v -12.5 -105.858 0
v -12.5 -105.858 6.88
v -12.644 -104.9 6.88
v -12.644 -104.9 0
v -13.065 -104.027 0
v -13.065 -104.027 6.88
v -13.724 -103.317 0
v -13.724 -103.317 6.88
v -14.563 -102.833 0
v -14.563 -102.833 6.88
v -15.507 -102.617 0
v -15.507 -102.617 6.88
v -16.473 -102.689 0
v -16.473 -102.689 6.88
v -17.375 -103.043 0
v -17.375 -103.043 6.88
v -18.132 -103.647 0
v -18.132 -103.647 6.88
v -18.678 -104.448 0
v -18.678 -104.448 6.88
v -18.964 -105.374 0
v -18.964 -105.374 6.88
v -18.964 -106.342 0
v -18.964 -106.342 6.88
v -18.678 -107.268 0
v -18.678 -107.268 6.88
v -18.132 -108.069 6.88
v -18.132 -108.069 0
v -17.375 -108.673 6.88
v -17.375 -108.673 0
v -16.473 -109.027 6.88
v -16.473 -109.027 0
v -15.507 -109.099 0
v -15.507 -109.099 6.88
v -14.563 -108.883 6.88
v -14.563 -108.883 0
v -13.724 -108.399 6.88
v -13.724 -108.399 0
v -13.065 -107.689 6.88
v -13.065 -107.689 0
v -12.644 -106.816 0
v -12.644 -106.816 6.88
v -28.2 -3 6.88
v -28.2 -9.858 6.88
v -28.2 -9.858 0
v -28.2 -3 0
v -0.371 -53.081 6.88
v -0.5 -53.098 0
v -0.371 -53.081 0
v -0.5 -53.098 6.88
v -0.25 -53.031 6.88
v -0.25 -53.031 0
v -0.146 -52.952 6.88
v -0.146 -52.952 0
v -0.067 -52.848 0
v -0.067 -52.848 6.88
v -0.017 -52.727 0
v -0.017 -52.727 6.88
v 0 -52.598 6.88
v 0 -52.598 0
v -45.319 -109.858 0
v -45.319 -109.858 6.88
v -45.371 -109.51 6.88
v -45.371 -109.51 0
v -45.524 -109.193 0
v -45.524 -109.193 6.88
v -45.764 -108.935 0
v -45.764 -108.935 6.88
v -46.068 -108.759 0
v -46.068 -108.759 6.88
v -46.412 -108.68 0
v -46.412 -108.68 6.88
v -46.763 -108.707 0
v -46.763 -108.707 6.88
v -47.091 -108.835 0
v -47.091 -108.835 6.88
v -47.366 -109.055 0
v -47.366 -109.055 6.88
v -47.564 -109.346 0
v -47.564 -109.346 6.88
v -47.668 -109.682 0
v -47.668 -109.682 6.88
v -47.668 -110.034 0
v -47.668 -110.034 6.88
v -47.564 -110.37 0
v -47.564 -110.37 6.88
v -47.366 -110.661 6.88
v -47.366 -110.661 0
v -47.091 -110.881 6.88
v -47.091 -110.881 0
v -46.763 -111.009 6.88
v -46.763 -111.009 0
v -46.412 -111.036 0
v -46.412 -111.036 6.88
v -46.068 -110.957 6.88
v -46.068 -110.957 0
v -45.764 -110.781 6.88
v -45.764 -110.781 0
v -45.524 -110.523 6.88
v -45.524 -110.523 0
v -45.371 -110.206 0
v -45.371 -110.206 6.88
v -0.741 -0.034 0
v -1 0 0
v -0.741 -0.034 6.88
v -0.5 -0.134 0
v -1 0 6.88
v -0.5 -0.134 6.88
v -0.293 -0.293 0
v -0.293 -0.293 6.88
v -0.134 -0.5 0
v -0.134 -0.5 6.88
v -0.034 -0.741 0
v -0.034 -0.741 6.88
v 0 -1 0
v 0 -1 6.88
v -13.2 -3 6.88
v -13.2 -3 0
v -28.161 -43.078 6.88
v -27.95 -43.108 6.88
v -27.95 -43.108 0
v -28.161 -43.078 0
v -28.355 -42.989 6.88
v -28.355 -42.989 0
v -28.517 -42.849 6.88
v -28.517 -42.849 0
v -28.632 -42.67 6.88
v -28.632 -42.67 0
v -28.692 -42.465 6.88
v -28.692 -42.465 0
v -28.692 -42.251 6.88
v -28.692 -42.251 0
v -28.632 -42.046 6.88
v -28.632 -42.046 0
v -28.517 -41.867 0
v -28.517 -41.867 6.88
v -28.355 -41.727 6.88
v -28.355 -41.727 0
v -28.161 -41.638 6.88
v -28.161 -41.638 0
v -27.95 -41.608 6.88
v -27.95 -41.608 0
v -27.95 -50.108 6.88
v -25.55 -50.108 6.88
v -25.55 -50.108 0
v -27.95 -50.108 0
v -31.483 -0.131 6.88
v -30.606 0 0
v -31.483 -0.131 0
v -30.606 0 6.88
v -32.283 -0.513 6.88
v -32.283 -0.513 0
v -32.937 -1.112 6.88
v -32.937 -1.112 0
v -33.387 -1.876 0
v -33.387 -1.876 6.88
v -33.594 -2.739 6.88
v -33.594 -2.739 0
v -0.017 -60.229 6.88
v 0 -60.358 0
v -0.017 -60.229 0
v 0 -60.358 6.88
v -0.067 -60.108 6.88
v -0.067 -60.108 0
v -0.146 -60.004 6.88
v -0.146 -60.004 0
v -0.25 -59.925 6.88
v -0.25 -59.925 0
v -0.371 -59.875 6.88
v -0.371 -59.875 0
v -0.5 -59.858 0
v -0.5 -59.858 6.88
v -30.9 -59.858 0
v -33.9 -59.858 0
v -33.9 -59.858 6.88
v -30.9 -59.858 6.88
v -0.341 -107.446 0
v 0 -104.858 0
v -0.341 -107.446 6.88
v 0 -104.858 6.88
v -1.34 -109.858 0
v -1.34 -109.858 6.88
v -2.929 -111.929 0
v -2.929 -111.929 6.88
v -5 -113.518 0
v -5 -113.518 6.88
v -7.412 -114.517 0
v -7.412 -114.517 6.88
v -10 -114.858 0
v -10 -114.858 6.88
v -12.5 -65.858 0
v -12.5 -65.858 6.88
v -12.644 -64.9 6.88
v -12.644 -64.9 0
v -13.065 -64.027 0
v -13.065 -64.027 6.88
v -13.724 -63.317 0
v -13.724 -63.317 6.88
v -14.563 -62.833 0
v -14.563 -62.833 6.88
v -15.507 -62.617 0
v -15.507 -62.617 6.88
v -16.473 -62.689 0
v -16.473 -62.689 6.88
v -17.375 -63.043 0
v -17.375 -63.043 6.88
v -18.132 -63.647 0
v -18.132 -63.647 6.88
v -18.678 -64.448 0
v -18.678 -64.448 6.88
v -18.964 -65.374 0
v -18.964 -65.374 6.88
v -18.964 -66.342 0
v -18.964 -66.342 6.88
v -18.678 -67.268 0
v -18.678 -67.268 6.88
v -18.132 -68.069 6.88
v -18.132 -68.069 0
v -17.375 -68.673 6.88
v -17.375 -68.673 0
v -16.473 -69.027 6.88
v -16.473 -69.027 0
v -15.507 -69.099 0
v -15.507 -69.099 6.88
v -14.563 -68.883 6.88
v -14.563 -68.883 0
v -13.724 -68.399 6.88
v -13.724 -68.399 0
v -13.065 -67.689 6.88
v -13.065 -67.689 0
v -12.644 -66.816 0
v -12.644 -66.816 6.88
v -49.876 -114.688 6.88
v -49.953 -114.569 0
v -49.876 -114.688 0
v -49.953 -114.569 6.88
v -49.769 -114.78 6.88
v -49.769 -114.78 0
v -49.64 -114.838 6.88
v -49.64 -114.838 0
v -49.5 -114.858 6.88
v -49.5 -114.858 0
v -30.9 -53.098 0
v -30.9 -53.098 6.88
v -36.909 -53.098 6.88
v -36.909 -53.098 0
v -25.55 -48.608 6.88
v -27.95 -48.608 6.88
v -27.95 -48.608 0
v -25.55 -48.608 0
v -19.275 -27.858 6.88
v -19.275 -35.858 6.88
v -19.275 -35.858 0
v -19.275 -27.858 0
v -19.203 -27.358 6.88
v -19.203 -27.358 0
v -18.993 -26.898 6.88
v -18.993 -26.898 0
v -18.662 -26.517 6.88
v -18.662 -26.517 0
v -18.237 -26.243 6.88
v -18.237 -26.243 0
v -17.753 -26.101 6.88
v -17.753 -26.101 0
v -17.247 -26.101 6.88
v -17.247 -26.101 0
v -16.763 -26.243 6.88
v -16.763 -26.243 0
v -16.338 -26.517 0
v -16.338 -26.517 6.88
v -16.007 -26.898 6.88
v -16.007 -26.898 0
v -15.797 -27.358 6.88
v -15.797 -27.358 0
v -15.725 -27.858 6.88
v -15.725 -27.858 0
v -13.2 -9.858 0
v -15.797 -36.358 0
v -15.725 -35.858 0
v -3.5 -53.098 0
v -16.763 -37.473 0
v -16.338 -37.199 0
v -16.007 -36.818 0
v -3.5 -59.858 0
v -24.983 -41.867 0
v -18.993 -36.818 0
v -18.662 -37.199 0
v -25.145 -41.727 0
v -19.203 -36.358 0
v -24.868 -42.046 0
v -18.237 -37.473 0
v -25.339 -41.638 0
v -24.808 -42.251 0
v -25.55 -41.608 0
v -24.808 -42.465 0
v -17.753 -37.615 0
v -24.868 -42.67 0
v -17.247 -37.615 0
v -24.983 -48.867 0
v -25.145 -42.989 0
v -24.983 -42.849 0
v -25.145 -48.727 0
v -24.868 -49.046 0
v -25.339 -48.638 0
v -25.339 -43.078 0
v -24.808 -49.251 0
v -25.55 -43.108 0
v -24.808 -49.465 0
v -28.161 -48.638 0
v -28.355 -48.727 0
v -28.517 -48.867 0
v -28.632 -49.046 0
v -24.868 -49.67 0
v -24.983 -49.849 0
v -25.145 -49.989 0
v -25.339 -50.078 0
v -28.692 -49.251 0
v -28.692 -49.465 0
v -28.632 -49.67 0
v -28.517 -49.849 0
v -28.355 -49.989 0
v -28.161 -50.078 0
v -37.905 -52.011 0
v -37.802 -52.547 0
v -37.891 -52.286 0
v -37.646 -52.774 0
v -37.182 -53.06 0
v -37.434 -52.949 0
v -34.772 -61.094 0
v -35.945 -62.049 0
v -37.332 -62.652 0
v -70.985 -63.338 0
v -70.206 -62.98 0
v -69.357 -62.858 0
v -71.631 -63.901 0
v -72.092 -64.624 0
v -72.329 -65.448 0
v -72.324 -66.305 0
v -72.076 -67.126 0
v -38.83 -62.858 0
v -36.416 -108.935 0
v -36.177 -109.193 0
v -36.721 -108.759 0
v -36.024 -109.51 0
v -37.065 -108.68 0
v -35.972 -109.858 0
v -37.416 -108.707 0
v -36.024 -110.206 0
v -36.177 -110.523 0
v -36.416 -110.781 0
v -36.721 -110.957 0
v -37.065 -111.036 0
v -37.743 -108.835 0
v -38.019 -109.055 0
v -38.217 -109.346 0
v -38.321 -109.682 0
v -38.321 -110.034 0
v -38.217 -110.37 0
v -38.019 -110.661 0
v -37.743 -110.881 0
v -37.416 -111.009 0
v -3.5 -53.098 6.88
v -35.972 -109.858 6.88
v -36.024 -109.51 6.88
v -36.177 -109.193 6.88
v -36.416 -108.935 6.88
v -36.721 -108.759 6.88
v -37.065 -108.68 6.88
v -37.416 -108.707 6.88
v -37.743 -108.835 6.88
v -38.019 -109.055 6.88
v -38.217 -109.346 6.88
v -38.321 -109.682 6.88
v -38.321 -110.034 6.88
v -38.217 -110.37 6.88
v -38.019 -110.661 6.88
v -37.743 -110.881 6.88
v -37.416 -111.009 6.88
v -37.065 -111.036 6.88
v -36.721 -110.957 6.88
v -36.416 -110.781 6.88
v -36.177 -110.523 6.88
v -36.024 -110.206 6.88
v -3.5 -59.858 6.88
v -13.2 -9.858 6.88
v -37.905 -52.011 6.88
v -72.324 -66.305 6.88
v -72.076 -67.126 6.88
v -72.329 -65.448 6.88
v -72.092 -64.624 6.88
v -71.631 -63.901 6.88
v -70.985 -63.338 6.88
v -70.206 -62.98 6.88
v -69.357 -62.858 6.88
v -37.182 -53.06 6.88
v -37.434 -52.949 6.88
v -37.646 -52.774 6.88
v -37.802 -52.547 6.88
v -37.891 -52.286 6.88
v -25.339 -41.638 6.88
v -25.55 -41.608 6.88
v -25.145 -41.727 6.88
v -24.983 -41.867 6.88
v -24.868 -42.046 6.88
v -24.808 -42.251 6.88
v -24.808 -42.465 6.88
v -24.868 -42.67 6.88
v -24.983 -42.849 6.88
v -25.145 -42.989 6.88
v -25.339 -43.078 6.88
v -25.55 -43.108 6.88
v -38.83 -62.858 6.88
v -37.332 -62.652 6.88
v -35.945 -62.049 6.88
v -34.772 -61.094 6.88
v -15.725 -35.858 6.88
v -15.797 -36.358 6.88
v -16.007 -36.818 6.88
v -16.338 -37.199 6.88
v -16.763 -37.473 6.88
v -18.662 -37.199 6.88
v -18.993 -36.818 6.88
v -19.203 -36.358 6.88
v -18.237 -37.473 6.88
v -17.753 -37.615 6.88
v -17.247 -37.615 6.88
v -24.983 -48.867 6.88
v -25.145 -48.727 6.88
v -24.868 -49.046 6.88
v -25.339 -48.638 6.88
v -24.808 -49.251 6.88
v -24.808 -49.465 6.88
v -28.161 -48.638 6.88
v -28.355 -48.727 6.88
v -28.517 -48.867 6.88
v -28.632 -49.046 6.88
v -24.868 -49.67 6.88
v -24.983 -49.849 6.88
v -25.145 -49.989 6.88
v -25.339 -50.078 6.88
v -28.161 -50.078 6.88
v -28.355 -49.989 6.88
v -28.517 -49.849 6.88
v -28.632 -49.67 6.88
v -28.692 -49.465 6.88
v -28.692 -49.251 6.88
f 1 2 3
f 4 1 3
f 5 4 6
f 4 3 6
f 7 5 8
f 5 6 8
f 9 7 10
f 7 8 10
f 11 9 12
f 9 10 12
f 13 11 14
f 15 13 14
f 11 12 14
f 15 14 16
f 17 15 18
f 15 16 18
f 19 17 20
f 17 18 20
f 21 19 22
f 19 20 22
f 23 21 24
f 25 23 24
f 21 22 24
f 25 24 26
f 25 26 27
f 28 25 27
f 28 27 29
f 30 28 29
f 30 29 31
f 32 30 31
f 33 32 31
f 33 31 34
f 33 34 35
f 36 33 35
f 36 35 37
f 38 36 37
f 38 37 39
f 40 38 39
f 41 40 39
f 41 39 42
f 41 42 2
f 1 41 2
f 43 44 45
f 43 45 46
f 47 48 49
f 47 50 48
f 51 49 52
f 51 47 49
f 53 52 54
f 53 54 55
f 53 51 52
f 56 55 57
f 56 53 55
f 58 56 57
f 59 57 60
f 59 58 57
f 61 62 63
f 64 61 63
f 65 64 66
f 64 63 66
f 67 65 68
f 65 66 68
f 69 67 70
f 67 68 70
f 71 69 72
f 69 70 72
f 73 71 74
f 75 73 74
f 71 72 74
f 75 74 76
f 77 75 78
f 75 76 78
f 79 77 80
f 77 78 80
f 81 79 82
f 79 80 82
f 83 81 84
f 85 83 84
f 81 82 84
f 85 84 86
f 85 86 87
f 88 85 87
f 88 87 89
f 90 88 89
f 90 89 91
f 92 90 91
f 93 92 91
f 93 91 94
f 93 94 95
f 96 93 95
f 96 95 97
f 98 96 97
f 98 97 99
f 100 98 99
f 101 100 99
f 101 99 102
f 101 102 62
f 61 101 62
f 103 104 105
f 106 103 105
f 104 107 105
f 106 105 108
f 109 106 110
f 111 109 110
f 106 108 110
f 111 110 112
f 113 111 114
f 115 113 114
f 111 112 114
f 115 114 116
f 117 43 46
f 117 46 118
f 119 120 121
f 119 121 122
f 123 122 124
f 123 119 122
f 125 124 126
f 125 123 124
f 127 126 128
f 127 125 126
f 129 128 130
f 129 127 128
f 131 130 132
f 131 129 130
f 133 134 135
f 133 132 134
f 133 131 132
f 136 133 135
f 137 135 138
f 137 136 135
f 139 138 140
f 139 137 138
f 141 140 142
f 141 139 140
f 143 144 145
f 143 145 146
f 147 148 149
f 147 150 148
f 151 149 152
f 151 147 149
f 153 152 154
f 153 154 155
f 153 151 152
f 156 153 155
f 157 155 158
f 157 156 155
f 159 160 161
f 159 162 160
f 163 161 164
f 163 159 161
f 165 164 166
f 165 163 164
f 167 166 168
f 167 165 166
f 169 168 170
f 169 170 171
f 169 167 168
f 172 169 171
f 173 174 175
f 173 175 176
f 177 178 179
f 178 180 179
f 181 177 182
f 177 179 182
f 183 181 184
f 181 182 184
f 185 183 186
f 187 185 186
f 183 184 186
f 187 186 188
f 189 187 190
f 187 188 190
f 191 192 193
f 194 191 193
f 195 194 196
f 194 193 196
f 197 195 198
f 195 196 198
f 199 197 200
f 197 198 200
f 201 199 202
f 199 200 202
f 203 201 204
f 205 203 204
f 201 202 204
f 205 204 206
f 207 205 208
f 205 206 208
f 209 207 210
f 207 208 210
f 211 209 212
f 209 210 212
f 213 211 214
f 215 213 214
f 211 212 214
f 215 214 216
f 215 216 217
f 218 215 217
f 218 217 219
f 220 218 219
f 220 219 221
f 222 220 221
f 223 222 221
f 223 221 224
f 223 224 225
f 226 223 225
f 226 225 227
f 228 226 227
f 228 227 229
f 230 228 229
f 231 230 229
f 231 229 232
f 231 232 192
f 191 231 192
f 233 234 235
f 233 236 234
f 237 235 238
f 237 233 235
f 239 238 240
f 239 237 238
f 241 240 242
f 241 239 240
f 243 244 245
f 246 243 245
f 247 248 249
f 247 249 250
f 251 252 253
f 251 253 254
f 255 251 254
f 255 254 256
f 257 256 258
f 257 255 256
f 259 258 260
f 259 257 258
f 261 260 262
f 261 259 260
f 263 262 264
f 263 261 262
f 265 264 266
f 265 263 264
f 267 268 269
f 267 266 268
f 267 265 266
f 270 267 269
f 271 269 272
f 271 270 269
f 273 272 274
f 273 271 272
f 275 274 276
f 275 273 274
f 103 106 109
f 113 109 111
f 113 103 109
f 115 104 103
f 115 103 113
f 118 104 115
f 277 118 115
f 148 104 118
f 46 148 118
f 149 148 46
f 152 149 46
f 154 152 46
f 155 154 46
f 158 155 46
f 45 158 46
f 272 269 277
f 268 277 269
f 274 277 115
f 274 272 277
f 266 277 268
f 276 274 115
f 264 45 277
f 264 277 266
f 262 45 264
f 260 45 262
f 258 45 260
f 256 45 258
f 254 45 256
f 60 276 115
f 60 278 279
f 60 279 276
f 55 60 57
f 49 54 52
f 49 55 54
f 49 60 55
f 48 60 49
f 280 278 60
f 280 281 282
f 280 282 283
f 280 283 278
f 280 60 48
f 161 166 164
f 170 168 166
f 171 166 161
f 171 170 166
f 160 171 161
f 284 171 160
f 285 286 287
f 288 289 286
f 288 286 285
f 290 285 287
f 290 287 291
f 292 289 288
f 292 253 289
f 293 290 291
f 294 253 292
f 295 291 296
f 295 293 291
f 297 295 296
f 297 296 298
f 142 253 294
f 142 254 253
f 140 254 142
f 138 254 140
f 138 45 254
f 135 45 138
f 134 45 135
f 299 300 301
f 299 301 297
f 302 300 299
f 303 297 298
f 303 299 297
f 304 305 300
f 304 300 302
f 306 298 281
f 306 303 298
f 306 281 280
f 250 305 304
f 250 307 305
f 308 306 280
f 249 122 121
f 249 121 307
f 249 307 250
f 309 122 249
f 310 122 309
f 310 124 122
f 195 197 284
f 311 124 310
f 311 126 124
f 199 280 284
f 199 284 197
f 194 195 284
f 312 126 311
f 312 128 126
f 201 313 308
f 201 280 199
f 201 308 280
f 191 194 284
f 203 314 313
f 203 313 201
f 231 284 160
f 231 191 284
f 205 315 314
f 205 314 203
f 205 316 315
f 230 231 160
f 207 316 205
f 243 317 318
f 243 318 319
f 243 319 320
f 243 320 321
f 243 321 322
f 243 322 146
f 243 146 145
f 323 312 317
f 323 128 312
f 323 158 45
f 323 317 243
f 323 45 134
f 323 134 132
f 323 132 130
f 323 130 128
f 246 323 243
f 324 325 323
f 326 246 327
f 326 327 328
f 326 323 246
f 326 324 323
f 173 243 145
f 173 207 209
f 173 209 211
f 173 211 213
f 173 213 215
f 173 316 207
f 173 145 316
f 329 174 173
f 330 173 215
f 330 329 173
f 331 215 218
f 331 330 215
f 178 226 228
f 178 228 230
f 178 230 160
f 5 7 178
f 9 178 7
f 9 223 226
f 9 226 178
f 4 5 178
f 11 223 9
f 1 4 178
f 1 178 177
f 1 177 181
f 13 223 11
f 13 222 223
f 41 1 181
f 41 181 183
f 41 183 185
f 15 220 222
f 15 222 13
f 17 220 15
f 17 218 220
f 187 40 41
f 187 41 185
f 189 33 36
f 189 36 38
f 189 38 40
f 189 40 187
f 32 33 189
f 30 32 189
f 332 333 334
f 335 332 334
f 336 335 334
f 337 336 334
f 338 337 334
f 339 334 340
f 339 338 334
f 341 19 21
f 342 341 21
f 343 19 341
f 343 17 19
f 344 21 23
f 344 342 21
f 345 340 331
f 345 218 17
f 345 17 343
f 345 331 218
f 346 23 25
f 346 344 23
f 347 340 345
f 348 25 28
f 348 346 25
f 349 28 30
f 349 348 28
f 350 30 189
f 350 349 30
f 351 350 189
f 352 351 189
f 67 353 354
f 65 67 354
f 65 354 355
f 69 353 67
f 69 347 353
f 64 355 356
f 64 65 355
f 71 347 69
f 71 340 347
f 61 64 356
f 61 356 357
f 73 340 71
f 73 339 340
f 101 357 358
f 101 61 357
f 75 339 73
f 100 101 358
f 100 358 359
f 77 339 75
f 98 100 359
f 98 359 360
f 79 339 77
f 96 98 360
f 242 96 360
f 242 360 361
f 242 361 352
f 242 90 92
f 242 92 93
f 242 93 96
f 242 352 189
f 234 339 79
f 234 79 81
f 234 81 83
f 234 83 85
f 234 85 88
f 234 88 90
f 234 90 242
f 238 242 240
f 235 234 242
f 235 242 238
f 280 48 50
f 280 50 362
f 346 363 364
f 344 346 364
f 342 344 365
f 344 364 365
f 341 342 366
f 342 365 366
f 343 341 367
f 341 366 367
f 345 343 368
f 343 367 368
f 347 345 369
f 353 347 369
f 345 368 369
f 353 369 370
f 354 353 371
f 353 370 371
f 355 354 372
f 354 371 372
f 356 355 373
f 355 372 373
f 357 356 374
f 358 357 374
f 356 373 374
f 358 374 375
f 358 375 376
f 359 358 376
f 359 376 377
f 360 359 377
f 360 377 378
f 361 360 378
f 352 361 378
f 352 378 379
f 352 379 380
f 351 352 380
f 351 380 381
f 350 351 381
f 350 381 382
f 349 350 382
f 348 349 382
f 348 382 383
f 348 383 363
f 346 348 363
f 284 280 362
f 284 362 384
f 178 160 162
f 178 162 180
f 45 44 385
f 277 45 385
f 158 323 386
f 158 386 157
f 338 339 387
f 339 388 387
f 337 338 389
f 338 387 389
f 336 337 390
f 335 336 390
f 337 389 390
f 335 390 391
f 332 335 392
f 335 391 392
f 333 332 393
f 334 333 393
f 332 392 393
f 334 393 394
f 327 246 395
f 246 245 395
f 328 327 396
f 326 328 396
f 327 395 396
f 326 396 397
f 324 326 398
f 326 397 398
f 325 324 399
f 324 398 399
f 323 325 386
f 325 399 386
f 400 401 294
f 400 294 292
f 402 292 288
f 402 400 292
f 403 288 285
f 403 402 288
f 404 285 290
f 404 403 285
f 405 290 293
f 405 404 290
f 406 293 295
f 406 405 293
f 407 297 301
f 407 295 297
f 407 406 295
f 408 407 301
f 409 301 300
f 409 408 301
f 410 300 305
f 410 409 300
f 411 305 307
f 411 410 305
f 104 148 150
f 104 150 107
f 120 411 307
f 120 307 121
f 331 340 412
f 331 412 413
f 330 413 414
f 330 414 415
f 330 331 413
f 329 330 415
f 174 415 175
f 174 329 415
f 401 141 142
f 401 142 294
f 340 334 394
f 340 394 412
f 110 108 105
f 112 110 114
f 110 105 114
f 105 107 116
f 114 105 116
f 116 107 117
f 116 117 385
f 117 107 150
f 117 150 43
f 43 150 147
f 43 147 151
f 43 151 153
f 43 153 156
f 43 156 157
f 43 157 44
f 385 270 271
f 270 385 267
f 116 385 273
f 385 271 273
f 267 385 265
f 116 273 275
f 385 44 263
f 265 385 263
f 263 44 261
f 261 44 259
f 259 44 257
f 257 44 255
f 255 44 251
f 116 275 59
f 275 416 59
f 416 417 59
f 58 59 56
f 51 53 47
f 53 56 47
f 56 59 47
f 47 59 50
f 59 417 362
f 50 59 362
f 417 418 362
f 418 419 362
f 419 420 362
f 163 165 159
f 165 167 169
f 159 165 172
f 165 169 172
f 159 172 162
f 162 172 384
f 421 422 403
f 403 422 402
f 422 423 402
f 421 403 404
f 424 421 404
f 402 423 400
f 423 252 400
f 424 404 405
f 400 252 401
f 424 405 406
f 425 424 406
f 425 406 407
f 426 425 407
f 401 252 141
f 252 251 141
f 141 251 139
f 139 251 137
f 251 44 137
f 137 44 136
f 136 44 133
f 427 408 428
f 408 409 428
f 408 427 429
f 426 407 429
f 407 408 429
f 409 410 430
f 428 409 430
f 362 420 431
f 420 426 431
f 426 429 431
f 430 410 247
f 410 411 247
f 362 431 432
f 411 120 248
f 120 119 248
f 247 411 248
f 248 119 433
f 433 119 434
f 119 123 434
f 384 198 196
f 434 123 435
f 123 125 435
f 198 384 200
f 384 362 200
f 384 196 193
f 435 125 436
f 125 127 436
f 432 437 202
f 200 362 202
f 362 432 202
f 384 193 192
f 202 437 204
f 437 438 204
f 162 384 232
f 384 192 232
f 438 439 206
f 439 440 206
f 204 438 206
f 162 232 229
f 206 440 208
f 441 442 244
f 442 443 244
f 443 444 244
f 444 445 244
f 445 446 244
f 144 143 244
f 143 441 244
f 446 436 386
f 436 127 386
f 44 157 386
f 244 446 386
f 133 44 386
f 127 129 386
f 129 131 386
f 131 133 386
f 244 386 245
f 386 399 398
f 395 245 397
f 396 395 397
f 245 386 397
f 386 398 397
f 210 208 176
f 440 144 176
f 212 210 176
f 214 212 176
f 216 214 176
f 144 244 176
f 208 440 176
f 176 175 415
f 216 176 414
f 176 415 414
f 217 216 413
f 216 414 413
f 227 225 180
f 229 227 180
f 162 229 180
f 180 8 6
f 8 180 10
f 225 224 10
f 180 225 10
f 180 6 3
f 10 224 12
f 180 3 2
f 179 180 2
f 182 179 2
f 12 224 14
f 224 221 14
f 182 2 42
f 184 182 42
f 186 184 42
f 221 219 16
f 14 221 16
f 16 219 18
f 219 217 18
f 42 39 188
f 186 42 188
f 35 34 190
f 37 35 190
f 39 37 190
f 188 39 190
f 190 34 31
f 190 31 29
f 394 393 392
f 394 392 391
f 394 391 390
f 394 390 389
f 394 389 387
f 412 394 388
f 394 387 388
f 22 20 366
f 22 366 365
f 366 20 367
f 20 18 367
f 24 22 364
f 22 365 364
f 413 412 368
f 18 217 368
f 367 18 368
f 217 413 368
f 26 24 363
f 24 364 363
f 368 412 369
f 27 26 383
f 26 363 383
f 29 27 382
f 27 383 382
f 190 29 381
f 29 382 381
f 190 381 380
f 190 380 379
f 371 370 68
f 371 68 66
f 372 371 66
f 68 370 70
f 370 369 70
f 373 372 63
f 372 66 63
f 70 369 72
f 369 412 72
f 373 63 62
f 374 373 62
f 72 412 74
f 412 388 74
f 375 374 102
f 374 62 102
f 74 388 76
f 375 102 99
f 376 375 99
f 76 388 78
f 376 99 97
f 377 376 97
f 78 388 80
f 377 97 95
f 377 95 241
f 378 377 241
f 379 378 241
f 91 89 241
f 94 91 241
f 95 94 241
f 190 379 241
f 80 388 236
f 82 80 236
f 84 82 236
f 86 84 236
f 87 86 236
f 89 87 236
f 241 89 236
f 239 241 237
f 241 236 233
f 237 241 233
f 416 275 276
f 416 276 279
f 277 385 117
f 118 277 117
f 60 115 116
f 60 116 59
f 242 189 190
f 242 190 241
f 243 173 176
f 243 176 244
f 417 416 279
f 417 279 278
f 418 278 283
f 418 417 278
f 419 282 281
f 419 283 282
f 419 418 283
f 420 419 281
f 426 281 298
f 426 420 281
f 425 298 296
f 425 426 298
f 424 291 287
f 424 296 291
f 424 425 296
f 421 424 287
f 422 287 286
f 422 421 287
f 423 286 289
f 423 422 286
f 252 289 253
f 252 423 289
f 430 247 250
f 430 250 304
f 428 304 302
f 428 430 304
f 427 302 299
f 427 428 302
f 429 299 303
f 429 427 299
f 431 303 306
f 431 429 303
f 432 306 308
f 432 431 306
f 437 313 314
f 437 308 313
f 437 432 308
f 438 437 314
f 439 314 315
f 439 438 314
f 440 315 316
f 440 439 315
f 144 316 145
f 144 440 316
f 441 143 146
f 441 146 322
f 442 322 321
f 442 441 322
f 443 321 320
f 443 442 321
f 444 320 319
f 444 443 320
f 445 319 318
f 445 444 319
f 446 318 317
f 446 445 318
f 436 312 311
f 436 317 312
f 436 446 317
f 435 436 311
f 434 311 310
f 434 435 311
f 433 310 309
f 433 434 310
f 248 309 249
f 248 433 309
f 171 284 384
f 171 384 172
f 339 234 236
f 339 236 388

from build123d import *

# Parameters (mm, degrees)
BOSS_EXTRUDE1_DEPTH = 6.88
SKETCH2_W           = 15
SKETCH2_H           = 6.858
CUT_EXTRUDE1_DEPTH  = 137.841297579
SKETCH3_R           = 3.25
CUT_EXTRUDE2_DEPTH  = 137.841297579
SKETCH4_R           = 1.1811
CUT_EXTRUDE3_DEPTH  = 137.841297579
CUT_EXTRUDE4_DEPTH  = 137.841297579
FILLET1_R           = 10
FILLET2_R           = 3
FILLET3_R           = 0.5
FILLET4_R           = 1
FILLET5_R           = 5.5512


with BuildPart() as part:
    # Sketch1 → Boss-Extrude1 (new body)
    with BuildSketch(Plane.XY):
        Polygon((-33.3545, 0), (0, 0), (0, -53.098), (-3.5, -53.098), (-3.5, -59.858), (0, -59.858), (0, -114.858), (-49.8185, -114.858), (-74.066498224, -62.858), (-33.899973056, -62.858), (-33.899973056, -59.858), (-30.899973056, -59.858), (-30.899973056, -53.098), (-37.999973056, -53.098), align=None)
    extrude(amount=BOSS_EXTRUDE1_DEPTH)

    # Sketch2 → Cut-Extrude1 (cut, through all)
    with BuildSketch(Plane.XY.offset(6.88)):
        with Locations((-20.7, -6.429)):
            Rectangle(SKETCH2_W, SKETCH2_H)
    extrude(amount=-CUT_EXTRUDE1_DEPTH, mode=Mode.SUBTRACT)

    # Sketch3 → Cut-Extrude2 (cut, through all)
    with BuildSketch(Plane.XY.offset(6.88)):
        with Locations((-15.75, -65.858)):
            Circle(SKETCH3_R)
        with Locations((-15.75, -105.858)):
            Circle(SKETCH3_R)
    extrude(amount=-CUT_EXTRUDE2_DEPTH, mode=Mode.SUBTRACT)

    # Sketch4 → Cut-Extrude3 (cut, through all)
    with BuildSketch(Plane.XY.offset(6.88)):
        with Locations((-46.5, -109.858)):
            Circle(SKETCH4_R)
        with Locations((-37.1528, -109.858)):
            Circle(SKETCH4_R)
        with BuildLine():
            Line((-27.95, -48.608), (-25.55, -48.608))
            ThreePointArc((-25.55, -48.608), (-24.8, -49.358), (-25.55, -50.108))
            Line((-25.55, -50.108), (-27.95, -50.108))
            ThreePointArc((-27.95, -50.108), (-28.7, -49.358), (-27.95, -48.608))
        make_face()
        with BuildLine():
            Line((-27.95, -41.608), (-25.55, -41.608))
            ThreePointArc((-25.55, -41.608), (-24.8, -42.358), (-25.55, -43.108))
            Line((-25.55, -43.108), (-27.95, -43.108))
            ThreePointArc((-27.95, -43.108), (-28.7, -42.358), (-27.95, -41.608))
        make_face()
    extrude(amount=-CUT_EXTRUDE3_DEPTH, mode=Mode.SUBTRACT)

    # Sketch5 → Cut-Extrude4 (cut, through all)
    with BuildSketch(Plane.XY.offset(6.88)):
        with BuildLine():
            Line((-15.725, -27.858), (-15.725, -35.858))
            ThreePointArc((-15.725, -35.858), (-17.5, -37.633), (-19.275, -35.858))
            Line((-19.275, -35.858), (-19.275, -27.858))
            ThreePointArc((-19.275, -27.858), (-17.5, -26.083), (-15.725, -27.858))
        make_face()
    extrude(amount=-CUT_EXTRUDE4_DEPTH, mode=Mode.SUBTRACT)

    # Fillet1
    fillet1_edges = [part.edges().sort_by_distance(p)[0] for p in [
        (0, -114.858, 3.44),
    ]]
    fillet(fillet1_edges, radius=FILLET1_R)

    # Fillet2
    fillet2_edges = [part.edges().sort_by_distance(p)[0] for p in [
        (-74.066498224, -62.858, 3.44),
        (-33.3545, 0, 3.44),
    ]]
    fillet(fillet2_edges, radius=FILLET2_R)

    # Fillet3
    fillet3_edges = [part.edges().sort_by_distance(p)[0] for p in [
        (0, -53.098, 3.44),
        (0, -59.858, 3.44),
        (-49.8185, -114.858, 3.44),
    ]]
    fillet(fillet3_edges, radius=FILLET3_R)

    # Fillet4
    fillet4_edges = [part.edges().sort_by_distance(p)[0] for p in [
        (0, 0, 3.44),
        (-37.999973056, -53.098, 3.44),
    ]]
    fillet(fillet4_edges, radius=FILLET4_R)

    # Fillet5
    # the kernel refuses this fillet: 5.5512 mm, written as the material it adds along each edge
    with BuildSketch(Plane(origin=(-33.899973056, -62.858, 0), x_dir=(0, 1, 0), z_dir=(0, 0, 1))) as fillet5_piece_1:
        with BuildLine():
            CenterArc((5.5512, 4.93023326), FILLET5_R, 180, 62.640229199)
            Line((0, 4.93023326), (-0.111024, 4.93023326))
            Line((-0.111024, 4.93023326), (-0.111024, 0))
            Line((-0.111024, 0), (0, -0.111024))
            ThreePointArc((0, -0.111024), (1.5, -0.111024), (2.948976, -0.098604665))
            Line((2.948976, -0.098604665), (3, 0))
        make_face()
    extrude(amount=6.88)


solid = part.part
